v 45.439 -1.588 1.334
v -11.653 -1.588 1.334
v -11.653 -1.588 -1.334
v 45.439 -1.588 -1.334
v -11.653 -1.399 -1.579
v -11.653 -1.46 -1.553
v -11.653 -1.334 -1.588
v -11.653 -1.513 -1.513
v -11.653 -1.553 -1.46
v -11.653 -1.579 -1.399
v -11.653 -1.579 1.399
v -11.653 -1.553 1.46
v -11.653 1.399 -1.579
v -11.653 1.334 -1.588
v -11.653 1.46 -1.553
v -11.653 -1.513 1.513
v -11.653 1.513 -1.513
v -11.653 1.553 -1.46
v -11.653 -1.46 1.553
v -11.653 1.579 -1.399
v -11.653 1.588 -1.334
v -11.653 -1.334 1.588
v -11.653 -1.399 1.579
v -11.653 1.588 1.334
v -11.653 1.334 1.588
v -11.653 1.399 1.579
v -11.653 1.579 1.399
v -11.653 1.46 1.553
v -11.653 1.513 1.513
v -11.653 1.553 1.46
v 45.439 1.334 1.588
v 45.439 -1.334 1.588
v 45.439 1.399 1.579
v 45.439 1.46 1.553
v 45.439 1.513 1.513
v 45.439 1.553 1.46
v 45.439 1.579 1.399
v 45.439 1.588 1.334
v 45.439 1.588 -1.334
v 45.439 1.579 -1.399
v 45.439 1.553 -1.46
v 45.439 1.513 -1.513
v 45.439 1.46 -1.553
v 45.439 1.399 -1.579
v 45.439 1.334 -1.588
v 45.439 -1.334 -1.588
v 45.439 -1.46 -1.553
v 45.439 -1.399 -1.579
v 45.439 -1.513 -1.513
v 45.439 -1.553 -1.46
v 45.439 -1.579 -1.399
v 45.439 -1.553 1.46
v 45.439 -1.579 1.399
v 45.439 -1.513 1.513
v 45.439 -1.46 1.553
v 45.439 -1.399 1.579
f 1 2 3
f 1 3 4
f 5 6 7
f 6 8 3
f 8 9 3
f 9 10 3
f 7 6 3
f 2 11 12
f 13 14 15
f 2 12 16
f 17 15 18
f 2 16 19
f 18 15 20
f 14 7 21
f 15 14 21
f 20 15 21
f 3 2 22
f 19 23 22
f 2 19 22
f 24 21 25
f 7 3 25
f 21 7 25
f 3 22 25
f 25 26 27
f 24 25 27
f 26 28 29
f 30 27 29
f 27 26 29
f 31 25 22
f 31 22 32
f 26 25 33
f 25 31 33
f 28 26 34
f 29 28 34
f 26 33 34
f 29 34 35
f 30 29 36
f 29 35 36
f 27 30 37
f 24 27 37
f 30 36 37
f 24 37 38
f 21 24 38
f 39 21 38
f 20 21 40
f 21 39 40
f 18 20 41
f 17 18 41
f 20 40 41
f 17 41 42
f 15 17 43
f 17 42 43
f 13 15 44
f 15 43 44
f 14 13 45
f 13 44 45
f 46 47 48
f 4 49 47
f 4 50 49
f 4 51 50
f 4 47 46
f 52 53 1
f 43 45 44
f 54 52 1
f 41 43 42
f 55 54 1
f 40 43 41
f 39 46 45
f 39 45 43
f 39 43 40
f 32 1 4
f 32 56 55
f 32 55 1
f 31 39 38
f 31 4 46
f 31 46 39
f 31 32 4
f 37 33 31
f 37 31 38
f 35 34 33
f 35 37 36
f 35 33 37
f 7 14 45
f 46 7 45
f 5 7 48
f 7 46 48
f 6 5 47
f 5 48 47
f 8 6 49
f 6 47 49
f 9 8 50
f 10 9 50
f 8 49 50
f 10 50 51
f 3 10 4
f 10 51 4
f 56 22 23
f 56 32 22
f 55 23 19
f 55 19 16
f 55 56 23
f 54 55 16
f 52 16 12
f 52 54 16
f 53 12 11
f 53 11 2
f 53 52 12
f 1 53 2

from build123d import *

# Parameters (mm, degrees)
SKETCH1_W           = 57.091934932
SKETCH1_H           = 3.175
BOSS_EXTRUDE1_DEPTH = 1.5875
FILLET1_R           = 0.254


with BuildPart() as part:
    # Sketch1 → Boss-Extrude1 (new, symmetric)
    with BuildSketch(Plane.XY):
        with Locations((16.893041934, 0)):
            Rectangle(SKETCH1_W, SKETCH1_H)
    extrude(amount=BOSS_EXTRUDE1_DEPTH, both=True)

    # Fillet1
    fillet1_edges = [part.edges().sort_by_distance(p)[0] for p in [
        (16.893041934, -1.5875, 1.5875),
        (16.893041934, -1.5875, -1.5875),
        (16.893041934, 1.5875, -1.5875),
        (16.893041934, 1.5875, 1.5875),
    ]]
    fillet(fillet1_edges, radius=FILLET1_R)


solid = part.part
